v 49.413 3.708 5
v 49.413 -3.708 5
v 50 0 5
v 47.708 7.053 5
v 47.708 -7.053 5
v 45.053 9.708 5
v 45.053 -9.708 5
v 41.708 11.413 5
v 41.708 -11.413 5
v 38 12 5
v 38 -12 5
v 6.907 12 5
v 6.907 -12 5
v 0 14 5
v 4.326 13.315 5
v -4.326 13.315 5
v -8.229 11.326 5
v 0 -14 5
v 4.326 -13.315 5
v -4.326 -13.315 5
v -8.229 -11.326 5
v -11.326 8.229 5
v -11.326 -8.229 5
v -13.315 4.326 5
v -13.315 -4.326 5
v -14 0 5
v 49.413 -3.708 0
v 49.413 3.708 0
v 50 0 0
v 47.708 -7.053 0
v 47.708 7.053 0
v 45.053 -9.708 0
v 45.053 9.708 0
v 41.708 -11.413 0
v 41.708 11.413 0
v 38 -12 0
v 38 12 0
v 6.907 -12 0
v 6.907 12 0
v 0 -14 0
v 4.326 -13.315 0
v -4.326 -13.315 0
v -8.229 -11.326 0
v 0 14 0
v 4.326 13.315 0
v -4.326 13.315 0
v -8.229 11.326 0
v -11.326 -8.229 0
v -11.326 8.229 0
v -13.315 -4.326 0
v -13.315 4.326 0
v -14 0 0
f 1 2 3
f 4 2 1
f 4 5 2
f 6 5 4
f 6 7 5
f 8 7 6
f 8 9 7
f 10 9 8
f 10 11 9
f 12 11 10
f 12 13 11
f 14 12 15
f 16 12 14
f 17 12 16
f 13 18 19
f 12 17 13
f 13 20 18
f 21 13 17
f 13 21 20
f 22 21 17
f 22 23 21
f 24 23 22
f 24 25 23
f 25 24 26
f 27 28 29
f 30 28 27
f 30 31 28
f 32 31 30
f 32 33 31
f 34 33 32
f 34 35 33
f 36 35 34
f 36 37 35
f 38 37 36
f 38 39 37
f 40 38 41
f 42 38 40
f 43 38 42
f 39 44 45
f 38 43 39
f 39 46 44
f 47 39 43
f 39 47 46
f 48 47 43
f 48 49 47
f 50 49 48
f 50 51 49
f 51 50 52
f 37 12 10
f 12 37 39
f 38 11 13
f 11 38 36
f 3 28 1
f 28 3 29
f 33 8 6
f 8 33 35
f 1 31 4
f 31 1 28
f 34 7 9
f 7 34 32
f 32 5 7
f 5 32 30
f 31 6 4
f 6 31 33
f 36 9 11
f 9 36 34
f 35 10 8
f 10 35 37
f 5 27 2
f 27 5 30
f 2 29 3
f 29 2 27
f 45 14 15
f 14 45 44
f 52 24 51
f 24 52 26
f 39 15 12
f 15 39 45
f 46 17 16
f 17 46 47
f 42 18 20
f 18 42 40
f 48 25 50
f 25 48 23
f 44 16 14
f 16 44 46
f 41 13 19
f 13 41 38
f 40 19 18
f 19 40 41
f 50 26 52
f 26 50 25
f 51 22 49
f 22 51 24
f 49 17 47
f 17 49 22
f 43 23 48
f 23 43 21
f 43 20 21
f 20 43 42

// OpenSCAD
// file: Library/center.scad
module center(axis){
	translate((axis / -2.0)){
		children();
	}
}
// file: CylinderDispenser_Dispenser_Virgin_Hearth_Outer_Lip.scad
radius = 24.0;
height = 5.0;

/* [OpenSCAD] [Quality] */
$fn = 20;

module CylinderDispenser_Dispenser_Virgin_Hearth_Outer_Lip(diameter, height){
		cylinder(d=diameter, h=height);
}

CylinderDispenser_Dispenser_Virgin_Hearth_Outer_Lip(radius, height);
// file: CylinderDispenser_Dispenser_Virgin_Hearth_Outer_Walkway.scad
use <Library/center.scad>

//Length, width, height.
dimensions = [50, 24, 5];

module CylinderDispenser_Dispenser_Virgin_Hearth_Outer_Walkway(dimensions){
	center([0, dimensions[1], 0]){
		cube(dimensions);
	}
}

CylinderDispenser_Dispenser_Virgin_Hearth_Outer_Walkway(dimensions);
// file: CylinderDispenser_Dispenser_Virgin_Hearth_Outer.scad
use <CylinderDispenser_Dispenser_Virgin_Hearth_Outer_Walkway.scad>
use <CylinderDispenser_Dispenser_Virgin_Hearth_Outer_Lip.scad>

//Length, width, height. The length is from the start of the the walkway to the end of the lip. The width can be though of as the diameter of the lip.
dimensions = [50, 15, 5];

/* [OpenSCAD] [Quality] */
$fn = 20;

module CylinderDispenser_Dispenser_Virgin_Hearth_Outer(dimensions){
	diameter = dimensions.y;
	radius = diameter / 2.0;
	walkwayLength = dimensions.x - radius;
	union(){
		CylinderDispenser_Dispenser_Virgin_Hearth_Outer_Walkway([walkwayLength, dimensions.y, dimensions.z]);
		translate([walkwayLength, 0, 0]){
			CylinderDispenser_Dispenser_Virgin_Hearth_Outer_Lip(diameter, dimensions.z);
		}
	}
}

CylinderDispenser_Dispenser_Virgin_Hearth_Outer(dimensions);
// file: CylinderDispenser_Dispenser_Virgin_Hearth_Inner.scad
//The diameter of the flue.
diameter = 24.0;
height = 5;

/* [OpenSCAD] [Quality] */
$fn = 20;

module CylinderDispenser_Dispenser_Virgin_Hearth_Inner(diameter, height){
	cylinder(d=diameter, h=height);
}

CylinderDispenser_Dispenser_Virgin_Hearth_Inner(diameter, height);
// main file
use <CylinderDispenser_Dispenser_Virgin_Hearth_Inner.scad>
use <CylinderDispenser_Dispenser_Virgin_Hearth_Outer.scad>

//Length, width, height. The length is from the start of the the walkway to the end of the lip. Here, the length doesn't include the length from the center to the back of the cylinder. The width can be though of as the diameter of the lip.
dimensions = [50, 24, 5];
flueDiameter = 28.0;

/* [OpenSCAD] [Quality] */
$fn = 20;

//"Brick" below the opening of the fireplace.
module CylinderDispenser_Dispenser_Virgin_Hearth(dimensions, flueDiameter){
	union(){
		color("gray", 1) CylinderDispenser_Dispenser_Virgin_Hearth_Inner(flueDiameter, dimensions.z);
		color("cyan", 1) CylinderDispenser_Dispenser_Virgin_Hearth_Outer(dimensions);
	}
}

CylinderDispenser_Dispenser_Virgin_Hearth(dimensions, flueDiameter);
